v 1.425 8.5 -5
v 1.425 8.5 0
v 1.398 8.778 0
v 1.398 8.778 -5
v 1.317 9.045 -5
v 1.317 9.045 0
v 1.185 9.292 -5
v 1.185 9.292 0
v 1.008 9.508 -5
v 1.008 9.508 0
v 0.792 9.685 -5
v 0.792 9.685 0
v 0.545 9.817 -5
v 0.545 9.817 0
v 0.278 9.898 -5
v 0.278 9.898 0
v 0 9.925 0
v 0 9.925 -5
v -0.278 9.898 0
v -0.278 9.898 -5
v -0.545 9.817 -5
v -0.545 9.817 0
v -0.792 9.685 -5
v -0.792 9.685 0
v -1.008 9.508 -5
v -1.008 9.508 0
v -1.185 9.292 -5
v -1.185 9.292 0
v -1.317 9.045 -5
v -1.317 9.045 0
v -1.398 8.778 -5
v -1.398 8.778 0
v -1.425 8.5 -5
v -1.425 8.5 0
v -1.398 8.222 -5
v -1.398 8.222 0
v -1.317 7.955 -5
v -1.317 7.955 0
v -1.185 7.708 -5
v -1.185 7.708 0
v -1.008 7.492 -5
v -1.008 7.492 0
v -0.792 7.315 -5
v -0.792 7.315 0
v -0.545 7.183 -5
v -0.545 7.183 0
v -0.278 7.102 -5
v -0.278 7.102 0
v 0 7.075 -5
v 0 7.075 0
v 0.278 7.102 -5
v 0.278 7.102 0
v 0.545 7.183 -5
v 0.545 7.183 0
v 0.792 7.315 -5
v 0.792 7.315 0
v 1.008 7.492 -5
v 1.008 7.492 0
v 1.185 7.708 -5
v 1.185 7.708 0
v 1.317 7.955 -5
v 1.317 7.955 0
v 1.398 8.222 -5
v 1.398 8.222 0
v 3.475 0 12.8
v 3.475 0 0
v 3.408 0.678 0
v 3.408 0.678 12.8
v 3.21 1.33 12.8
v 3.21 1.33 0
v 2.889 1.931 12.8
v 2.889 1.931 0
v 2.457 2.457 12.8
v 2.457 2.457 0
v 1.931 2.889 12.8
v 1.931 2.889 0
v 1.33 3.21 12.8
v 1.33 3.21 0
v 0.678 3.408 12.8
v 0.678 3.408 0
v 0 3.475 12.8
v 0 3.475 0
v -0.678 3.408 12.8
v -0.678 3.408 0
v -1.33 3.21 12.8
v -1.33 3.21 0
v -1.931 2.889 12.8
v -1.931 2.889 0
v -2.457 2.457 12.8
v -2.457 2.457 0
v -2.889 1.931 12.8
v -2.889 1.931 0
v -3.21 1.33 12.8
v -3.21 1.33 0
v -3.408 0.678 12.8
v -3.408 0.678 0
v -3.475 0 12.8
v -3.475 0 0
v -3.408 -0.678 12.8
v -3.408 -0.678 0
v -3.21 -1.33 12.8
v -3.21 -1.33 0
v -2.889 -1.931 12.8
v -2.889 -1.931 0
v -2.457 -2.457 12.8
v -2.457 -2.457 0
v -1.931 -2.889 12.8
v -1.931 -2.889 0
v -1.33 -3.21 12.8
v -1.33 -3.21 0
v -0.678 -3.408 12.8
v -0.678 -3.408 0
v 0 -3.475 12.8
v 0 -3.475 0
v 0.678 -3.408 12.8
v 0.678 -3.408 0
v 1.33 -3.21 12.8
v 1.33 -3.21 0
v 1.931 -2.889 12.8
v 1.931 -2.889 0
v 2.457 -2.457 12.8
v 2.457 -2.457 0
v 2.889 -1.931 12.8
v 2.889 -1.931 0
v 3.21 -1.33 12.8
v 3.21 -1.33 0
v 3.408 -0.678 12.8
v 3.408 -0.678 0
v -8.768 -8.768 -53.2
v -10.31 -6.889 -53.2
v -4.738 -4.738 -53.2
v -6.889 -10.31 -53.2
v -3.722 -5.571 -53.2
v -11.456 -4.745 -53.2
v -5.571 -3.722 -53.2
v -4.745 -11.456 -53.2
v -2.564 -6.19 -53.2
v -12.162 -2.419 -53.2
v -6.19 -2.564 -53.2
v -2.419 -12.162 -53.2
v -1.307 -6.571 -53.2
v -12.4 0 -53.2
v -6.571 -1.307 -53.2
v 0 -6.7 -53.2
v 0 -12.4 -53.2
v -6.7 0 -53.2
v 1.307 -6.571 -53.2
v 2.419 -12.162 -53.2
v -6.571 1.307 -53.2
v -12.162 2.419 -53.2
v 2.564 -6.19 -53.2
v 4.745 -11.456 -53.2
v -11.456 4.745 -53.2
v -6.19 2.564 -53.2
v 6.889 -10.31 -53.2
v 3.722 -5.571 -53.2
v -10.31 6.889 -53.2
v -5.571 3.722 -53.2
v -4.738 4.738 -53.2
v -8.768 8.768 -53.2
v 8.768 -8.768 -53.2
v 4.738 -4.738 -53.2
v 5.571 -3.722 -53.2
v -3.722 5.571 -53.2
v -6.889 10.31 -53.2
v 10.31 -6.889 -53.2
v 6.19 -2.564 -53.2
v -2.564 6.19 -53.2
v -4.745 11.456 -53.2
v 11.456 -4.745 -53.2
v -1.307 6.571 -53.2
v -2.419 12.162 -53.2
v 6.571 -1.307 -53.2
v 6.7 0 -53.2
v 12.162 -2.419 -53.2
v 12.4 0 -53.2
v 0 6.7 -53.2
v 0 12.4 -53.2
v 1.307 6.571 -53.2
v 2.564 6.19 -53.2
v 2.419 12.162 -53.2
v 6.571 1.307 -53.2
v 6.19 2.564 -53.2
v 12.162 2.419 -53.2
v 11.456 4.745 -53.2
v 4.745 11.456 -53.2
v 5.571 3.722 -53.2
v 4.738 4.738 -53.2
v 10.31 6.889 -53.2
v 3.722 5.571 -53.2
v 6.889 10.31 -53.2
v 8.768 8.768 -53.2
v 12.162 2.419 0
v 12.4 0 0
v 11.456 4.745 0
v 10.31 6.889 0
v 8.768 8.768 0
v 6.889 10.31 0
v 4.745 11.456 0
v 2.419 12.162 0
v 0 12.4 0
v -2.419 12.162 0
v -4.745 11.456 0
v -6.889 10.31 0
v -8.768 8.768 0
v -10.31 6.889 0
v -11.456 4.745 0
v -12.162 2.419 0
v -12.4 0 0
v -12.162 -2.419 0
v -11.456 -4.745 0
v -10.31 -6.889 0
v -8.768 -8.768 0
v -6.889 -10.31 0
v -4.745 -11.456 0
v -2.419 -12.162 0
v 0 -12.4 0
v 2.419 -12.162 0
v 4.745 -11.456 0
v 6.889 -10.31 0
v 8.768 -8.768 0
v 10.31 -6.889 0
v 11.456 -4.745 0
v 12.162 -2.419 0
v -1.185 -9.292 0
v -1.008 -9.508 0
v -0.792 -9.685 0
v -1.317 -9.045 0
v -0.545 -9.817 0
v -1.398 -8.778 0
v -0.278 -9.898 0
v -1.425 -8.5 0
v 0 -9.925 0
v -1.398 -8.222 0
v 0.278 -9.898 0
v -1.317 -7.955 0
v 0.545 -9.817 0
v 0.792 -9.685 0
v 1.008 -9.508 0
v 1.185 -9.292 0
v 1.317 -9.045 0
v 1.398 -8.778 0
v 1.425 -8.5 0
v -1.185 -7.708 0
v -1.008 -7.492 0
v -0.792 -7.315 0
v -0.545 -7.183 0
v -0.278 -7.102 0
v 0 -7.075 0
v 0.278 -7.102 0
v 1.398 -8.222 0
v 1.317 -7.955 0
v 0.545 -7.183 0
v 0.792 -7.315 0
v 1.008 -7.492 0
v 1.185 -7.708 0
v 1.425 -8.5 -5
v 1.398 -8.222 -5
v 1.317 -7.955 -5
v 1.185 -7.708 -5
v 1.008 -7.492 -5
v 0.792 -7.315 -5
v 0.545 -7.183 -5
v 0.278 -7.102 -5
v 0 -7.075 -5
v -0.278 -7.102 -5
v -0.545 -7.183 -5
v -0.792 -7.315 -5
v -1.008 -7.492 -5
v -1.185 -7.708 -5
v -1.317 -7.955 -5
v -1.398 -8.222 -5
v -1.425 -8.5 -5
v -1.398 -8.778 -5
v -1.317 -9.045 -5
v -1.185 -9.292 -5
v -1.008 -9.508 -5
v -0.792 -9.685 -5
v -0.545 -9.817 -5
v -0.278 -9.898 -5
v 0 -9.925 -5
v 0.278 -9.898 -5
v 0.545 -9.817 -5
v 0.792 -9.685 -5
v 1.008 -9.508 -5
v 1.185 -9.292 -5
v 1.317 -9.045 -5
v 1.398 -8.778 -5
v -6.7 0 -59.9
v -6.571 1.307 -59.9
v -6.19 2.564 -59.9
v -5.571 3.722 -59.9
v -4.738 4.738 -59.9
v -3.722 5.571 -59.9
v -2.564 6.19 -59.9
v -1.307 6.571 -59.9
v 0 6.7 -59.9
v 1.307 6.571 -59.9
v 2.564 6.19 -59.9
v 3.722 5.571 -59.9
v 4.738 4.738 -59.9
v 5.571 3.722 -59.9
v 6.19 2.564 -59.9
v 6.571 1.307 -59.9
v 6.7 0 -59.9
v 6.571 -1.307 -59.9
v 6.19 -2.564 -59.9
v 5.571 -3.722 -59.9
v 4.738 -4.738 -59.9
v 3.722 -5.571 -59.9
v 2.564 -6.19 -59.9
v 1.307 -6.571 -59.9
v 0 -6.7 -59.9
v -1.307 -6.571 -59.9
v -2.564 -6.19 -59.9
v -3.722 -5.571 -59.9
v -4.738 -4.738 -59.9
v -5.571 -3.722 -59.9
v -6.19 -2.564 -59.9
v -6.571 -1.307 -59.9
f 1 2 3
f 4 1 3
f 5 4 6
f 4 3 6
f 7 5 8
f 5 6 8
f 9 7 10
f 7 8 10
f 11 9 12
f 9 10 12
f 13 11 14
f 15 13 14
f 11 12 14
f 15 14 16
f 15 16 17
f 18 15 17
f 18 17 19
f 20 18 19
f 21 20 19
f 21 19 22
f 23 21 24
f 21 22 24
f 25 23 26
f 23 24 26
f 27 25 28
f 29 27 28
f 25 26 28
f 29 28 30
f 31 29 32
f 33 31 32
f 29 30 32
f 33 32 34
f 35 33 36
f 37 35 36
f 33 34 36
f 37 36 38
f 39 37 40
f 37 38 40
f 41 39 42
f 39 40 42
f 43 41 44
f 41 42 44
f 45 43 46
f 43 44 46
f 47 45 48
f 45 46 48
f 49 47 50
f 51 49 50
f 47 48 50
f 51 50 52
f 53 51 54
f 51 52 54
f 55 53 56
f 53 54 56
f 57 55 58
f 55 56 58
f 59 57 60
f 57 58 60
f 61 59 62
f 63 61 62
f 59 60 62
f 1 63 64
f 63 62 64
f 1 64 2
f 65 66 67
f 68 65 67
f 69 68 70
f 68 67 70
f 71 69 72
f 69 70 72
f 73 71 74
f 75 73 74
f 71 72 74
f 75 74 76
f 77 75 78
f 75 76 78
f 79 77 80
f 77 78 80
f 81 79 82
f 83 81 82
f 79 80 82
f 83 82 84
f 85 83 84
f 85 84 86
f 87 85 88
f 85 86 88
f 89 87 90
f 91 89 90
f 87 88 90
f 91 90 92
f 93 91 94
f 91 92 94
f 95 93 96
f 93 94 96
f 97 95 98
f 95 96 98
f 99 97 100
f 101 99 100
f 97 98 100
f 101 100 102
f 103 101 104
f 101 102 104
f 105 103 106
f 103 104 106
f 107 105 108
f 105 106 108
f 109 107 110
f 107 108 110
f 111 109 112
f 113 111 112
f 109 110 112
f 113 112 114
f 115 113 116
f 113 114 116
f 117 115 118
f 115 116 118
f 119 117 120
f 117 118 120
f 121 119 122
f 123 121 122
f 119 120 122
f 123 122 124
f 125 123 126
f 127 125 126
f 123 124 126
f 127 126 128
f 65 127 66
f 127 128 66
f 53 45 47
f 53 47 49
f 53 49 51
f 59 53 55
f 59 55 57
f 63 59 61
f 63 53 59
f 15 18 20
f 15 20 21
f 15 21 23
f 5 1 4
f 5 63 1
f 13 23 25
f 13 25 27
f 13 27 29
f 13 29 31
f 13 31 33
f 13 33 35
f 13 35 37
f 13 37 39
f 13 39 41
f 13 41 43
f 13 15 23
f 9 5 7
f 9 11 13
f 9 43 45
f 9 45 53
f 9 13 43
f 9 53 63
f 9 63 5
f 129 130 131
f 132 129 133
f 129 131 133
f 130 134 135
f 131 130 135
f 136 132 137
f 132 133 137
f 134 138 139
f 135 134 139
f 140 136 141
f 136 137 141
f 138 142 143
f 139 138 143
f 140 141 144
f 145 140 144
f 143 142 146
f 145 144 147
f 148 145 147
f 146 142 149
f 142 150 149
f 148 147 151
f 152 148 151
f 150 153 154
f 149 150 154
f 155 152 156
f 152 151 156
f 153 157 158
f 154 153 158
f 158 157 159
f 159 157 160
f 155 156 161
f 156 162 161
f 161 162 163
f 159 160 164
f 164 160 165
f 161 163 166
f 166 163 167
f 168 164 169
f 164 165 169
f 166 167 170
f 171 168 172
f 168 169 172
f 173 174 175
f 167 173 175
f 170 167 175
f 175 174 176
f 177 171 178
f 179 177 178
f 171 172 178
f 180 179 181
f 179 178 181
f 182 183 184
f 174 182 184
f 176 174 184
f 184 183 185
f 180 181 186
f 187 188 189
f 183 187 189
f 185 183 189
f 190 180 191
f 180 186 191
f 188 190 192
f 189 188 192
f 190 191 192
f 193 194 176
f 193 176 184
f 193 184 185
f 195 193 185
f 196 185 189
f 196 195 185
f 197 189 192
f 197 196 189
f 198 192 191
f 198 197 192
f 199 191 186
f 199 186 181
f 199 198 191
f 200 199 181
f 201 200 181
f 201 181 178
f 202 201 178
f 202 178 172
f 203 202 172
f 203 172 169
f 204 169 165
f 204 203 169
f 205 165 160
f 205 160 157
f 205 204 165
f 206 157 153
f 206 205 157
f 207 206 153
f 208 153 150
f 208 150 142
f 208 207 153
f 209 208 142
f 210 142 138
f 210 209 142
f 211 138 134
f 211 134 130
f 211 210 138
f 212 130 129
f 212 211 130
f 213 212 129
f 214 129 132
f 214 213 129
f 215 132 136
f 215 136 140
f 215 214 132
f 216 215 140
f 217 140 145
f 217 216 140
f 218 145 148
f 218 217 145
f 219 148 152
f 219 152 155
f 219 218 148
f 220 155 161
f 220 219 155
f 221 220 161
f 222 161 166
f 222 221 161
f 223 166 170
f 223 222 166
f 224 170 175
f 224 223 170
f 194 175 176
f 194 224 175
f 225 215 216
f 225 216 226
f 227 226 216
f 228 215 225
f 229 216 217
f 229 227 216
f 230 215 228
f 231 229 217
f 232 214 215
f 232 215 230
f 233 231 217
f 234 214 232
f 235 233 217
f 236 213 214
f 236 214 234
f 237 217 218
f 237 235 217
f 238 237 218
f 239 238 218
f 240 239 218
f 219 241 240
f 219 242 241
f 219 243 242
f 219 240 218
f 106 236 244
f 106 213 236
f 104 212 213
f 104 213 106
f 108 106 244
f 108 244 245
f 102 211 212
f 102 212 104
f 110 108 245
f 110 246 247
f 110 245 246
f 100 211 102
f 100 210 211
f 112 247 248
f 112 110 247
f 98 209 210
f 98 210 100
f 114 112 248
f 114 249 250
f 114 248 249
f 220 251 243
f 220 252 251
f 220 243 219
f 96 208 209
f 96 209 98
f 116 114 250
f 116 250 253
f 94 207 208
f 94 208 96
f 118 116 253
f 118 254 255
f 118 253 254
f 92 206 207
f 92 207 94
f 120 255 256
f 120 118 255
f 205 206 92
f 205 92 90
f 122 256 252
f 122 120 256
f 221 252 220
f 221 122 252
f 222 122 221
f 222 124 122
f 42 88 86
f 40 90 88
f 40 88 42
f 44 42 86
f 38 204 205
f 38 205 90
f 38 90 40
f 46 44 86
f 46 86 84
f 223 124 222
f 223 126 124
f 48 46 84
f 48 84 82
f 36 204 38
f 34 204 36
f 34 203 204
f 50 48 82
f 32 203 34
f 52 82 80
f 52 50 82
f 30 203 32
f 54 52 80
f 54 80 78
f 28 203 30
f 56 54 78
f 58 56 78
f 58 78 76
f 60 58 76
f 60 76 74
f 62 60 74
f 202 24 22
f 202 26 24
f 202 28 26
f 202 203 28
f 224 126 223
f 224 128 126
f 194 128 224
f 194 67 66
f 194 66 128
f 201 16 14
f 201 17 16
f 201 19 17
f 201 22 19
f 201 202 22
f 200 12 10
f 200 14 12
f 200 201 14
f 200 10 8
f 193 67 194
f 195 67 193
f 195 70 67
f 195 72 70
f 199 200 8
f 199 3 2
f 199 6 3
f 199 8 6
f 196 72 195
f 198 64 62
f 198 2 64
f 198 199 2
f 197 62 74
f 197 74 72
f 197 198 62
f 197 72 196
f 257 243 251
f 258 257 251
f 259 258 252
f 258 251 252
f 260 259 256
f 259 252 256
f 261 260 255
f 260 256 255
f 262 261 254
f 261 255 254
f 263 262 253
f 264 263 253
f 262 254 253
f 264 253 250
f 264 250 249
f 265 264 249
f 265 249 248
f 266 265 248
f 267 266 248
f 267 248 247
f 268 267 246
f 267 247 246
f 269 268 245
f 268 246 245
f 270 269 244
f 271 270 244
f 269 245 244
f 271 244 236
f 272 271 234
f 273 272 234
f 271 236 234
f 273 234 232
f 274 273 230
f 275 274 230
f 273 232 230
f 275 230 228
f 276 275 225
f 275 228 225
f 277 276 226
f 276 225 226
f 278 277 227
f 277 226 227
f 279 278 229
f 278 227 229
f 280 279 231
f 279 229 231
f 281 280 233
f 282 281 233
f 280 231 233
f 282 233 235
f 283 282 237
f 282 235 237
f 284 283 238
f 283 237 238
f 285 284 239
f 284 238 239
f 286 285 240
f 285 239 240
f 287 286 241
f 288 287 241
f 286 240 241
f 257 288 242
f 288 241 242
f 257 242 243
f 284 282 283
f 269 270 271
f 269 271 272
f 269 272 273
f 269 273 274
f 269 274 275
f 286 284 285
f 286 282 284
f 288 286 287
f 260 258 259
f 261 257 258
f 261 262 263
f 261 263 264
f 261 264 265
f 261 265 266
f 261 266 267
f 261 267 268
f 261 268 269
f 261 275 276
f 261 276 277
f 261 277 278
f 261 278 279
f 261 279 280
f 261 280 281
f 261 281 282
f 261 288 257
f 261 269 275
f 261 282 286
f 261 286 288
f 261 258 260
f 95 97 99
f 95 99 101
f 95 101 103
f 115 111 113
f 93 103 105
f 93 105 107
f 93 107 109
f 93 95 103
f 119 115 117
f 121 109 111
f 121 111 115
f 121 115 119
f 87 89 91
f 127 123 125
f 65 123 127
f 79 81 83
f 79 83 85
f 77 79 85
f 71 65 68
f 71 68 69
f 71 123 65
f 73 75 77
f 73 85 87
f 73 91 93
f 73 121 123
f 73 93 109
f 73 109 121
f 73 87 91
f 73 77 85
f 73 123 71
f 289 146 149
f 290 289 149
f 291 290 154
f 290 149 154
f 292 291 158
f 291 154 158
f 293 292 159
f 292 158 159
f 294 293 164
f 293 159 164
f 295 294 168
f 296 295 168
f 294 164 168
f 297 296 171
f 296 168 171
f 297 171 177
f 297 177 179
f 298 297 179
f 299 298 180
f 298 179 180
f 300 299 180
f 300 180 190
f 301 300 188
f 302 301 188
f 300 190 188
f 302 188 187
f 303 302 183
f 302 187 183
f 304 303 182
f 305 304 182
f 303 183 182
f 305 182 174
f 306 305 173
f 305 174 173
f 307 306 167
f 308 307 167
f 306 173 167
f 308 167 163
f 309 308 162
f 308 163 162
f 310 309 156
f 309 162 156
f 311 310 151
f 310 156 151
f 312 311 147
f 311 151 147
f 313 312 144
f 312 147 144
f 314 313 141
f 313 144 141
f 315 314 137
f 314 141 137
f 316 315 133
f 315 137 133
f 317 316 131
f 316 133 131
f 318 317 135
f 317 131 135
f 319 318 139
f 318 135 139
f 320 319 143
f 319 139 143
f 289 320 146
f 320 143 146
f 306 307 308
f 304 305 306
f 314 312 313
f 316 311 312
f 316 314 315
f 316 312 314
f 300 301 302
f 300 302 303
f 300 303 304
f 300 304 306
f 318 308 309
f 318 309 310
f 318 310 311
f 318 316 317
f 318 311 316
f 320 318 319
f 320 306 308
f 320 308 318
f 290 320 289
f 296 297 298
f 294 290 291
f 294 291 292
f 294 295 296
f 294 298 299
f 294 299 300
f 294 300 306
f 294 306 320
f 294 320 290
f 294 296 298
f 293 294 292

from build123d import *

# Parameters (mm, degrees)
SKETCH1_R           = 12.4
BOSS_EXTRUDE1_DEPTH = 53.2
SKETCH2_R           = 3.475
BOSS_EXTRUDE2_DEPTH = 12.8
SKETCH3_R           = 1.425
CUT_EXTRUDE1_DEPTH  = 5
SKETCH4_R           = 6.7
BOSS_EXTRUDE3_DEPTH = 6.7


with BuildPart() as part:
    # Sketch1 → Boss-Extrude1 (new body)
    with BuildSketch(Plane.XY):
        Circle(SKETCH1_R)
    extrude(amount=-BOSS_EXTRUDE1_DEPTH)

    # Sketch2 → Boss-Extrude2 (add)
    with BuildSketch(Plane.XY):
        Circle(SKETCH2_R)
    extrude(amount=BOSS_EXTRUDE2_DEPTH)

    # Sketch3 → Cut-Extrude1 (cut)
    with BuildSketch(Plane.XY):
        with Locations((0, 8.5)):
            Circle(SKETCH3_R)
        with Locations((0, -8.5)):
            Circle(SKETCH3_R)
    extrude(amount=-CUT_EXTRUDE1_DEPTH, mode=Mode.SUBTRACT)

    # Sketch4 → Boss-Extrude3 (add)
    with BuildSketch(Plane(origin=(0, 0, -53.2), x_dir=(-1, 0, 0), z_dir=(0, 0, -1))):
        Circle(SKETCH4_R)
    extrude(amount=BOSS_EXTRUDE3_DEPTH)


solid = part.part
